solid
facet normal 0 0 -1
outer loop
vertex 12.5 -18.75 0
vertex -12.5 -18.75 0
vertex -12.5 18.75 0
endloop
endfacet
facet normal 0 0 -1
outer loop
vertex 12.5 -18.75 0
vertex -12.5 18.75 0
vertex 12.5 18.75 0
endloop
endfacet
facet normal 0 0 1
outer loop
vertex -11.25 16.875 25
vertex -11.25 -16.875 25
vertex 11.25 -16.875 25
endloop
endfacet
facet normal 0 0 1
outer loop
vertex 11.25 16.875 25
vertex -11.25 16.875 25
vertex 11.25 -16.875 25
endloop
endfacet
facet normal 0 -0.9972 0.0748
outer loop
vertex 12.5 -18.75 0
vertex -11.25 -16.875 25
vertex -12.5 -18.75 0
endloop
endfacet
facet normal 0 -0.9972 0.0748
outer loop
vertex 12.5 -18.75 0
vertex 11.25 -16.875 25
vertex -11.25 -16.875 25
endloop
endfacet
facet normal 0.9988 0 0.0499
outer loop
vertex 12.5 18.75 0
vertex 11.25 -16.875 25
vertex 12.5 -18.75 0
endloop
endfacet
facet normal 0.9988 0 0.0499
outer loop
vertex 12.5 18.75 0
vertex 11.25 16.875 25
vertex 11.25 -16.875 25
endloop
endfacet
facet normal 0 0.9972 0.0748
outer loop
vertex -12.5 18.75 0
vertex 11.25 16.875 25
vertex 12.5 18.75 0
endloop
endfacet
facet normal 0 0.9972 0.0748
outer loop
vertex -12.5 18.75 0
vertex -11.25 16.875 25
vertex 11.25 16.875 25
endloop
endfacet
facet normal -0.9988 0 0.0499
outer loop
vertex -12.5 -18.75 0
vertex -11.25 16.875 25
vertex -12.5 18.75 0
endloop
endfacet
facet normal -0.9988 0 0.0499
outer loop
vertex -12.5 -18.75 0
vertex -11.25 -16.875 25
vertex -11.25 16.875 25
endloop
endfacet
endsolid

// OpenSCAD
linear_extrude(height=25, scale=0.9) {
		square([25,25*1.5], center=true);
}
